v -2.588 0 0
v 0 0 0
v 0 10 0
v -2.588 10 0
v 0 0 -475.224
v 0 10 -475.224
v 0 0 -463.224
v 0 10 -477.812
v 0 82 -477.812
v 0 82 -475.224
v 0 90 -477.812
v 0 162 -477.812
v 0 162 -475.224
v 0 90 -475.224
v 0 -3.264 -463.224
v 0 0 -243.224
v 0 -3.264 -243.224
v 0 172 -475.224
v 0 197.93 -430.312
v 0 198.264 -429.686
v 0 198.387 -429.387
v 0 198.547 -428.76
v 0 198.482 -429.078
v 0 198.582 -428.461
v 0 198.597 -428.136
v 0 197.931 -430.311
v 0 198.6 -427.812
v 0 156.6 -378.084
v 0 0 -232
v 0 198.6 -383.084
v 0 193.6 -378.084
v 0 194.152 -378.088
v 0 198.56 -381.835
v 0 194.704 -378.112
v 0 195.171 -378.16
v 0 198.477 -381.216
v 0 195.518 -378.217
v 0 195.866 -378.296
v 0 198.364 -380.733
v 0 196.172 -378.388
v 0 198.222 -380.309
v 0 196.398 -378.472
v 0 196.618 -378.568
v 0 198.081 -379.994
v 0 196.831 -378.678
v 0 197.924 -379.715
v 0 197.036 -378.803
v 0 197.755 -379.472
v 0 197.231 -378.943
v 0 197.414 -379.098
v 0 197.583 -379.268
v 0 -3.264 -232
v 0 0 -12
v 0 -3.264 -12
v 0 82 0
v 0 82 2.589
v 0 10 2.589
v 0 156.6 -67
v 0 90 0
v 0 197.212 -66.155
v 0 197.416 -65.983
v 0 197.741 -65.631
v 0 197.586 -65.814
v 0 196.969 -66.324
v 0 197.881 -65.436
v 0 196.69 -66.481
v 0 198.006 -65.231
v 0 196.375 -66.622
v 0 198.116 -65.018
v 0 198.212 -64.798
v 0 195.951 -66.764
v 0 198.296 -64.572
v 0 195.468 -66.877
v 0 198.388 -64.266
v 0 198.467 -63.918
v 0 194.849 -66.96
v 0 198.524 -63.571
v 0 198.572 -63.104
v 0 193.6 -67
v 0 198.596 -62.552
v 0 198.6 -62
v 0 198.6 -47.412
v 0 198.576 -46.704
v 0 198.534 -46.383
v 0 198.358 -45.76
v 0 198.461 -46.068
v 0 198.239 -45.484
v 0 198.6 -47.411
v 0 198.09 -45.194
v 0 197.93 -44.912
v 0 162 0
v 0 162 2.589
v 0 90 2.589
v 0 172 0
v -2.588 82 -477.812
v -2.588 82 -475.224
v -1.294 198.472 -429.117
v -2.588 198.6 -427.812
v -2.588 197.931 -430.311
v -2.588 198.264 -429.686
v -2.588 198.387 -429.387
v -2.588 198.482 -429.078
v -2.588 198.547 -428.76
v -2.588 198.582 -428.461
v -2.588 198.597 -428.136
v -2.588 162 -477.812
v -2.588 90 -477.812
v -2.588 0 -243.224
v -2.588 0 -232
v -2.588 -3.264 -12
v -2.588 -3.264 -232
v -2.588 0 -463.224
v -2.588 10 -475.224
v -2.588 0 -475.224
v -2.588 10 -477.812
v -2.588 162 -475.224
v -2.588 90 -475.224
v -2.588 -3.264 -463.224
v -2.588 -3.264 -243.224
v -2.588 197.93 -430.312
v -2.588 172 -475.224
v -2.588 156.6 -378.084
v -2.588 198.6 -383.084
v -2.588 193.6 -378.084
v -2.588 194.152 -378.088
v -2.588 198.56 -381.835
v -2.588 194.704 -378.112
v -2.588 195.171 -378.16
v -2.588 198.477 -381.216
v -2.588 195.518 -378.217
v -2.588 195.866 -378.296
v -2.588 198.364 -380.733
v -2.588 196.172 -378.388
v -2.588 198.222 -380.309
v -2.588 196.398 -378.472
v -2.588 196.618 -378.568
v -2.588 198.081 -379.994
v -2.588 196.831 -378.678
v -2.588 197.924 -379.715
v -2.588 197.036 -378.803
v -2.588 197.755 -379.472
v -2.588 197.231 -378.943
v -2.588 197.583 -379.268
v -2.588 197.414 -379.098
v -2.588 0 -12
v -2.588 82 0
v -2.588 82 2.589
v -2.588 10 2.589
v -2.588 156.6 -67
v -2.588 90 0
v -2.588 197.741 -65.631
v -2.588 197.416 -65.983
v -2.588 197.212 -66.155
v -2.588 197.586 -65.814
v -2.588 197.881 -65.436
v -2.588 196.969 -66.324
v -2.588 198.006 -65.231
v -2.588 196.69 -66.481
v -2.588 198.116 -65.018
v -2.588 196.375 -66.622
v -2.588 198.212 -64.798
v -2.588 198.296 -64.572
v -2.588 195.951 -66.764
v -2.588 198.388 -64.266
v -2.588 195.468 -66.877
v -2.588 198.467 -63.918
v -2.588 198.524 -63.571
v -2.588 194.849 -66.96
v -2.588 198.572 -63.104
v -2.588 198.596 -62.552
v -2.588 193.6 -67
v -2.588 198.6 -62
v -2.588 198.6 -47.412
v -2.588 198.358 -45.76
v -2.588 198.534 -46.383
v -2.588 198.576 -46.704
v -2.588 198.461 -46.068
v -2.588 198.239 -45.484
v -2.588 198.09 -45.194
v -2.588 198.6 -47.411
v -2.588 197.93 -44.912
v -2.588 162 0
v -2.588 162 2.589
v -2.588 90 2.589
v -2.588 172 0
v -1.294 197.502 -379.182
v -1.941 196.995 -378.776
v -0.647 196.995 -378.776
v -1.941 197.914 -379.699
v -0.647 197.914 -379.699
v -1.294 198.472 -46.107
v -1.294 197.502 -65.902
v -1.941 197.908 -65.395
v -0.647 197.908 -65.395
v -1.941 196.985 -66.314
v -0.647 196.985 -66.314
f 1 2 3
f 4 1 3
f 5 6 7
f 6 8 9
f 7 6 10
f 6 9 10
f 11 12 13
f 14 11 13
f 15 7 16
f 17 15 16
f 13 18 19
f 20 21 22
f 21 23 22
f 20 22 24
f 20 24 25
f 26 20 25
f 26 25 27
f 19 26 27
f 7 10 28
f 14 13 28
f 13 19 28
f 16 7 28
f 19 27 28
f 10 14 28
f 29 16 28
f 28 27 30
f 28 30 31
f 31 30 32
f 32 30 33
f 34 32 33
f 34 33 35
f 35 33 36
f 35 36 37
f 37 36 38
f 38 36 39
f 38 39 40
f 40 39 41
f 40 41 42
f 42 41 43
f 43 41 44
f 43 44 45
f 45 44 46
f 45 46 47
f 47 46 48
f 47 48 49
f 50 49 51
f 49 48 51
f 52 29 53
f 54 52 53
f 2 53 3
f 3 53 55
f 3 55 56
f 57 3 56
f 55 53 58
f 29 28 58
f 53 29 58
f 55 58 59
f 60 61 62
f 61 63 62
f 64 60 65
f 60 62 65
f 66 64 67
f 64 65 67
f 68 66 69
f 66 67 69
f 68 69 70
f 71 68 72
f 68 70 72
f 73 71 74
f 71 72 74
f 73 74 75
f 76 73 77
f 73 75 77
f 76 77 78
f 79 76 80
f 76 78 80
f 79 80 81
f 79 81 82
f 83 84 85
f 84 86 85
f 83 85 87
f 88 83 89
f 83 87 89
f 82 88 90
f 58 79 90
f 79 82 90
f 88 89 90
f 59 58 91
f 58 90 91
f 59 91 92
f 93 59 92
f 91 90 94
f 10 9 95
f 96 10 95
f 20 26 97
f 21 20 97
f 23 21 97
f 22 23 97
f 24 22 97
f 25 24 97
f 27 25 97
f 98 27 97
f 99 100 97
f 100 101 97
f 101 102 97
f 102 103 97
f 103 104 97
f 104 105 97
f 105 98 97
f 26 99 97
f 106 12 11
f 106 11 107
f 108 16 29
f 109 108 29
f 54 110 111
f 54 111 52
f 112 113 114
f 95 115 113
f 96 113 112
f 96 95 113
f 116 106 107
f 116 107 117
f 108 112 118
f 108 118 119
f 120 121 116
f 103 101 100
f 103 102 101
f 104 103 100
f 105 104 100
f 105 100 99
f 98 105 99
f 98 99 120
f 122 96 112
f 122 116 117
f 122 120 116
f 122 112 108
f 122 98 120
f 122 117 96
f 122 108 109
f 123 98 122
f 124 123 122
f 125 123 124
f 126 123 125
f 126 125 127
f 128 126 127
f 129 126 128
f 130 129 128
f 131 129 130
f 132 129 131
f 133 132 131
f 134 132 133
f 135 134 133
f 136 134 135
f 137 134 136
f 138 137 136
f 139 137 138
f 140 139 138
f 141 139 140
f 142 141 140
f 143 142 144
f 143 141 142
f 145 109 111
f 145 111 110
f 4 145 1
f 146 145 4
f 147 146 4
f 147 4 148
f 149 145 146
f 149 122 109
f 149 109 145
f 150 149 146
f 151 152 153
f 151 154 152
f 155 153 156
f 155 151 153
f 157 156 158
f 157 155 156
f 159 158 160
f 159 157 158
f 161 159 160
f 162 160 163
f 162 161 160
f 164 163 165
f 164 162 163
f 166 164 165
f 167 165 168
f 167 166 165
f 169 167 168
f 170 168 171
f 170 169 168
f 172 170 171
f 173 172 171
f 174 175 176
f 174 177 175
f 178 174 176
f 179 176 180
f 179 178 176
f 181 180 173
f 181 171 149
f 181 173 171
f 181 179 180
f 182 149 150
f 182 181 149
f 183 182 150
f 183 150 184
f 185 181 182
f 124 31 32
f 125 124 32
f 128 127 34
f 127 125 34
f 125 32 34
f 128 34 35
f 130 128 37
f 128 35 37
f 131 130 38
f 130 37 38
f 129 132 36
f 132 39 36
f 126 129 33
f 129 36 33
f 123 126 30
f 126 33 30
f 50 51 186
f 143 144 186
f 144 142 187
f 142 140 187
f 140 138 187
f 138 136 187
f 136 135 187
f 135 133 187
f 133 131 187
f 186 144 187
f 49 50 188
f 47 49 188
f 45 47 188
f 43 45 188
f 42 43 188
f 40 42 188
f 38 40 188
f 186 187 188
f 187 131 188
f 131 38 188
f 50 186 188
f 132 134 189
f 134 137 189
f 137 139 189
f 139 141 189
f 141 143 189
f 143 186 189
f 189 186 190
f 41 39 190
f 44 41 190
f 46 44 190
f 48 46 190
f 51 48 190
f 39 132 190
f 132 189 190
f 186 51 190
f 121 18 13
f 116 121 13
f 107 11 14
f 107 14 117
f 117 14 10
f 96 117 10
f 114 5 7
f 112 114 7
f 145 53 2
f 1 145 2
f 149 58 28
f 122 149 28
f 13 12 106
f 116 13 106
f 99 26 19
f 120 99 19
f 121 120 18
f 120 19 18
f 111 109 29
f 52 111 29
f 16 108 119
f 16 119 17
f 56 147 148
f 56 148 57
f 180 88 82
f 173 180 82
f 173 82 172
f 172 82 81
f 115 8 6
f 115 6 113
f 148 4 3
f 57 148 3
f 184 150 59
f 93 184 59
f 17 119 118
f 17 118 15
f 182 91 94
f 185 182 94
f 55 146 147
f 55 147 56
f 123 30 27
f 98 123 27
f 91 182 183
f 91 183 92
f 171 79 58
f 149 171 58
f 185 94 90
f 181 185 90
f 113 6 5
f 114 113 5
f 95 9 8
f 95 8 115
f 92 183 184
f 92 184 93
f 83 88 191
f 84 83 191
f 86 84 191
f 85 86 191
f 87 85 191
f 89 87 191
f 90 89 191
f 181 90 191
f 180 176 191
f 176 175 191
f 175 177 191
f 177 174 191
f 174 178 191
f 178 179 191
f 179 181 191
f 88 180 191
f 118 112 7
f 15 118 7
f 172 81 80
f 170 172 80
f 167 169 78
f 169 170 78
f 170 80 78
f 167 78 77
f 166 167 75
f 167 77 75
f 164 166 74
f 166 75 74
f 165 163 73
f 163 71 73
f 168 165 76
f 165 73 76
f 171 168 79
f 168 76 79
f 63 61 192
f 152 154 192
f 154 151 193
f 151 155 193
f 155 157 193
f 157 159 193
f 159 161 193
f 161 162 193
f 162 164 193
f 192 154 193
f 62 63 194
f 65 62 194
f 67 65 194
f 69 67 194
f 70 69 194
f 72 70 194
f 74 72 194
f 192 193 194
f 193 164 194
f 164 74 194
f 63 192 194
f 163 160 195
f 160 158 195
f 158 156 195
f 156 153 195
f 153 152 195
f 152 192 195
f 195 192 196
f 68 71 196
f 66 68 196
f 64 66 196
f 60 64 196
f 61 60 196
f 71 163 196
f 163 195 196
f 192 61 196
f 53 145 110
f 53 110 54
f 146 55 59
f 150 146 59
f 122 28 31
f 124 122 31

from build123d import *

# Parameters (mm, degrees)
BASE_FLANGE1_DEPTH  = 2.588
SKETCH2_W           = 2.588
SKETCH2_H           = 72
BOSS_EXTRUDE1_DEPTH = 2.588
SKETCH3_W           = 2.588
SKETCH3_H           = 220
BOSS_EXTRUDE2_DEPTH = 3.264
SKETCH4_W           = 2.588
SKETCH4_H           = 72
BOSS_EXTRUDE3_DEPTH = 2.5888
FILLET1_SIZE        = 5


# Sheet-metal steps are written as plain solids
with BuildPart() as part:
    # Base-Flange1: sheet metal written as solids
    # Sketch1 → Base-Flange1 (new body)
    with BuildSketch(Plane(origin=(0, 0, 0), x_dir=(0, 0, -1), z_dir=(1, 0, 0))):
        Polygon((0, 172), (46.072551481, 198.6), (67, 198.6), (67, 156.6), (378.084, 156.6), (378.084, 198.6), (429.151448519, 198.6), (475.224, 172), (475.224, 0), (0, 0), align=None)
    extrude(amount=-BASE_FLANGE1_DEPTH)

    # Sketch2 → Boss-Extrude1 (add)
    with BuildSketch(Plane(origin=(0, 0, -475.224), x_dir=(-1, 0, 0), z_dir=(0, 0, -1))):
        with Locations((1.294, 126)):
            Rectangle(SKETCH2_W, SKETCH2_H)
        with Locations((1.294, 46)):
            Rectangle(SKETCH2_W, SKETCH2_H)
    extrude(amount=BOSS_EXTRUDE1_DEPTH)

    # Sketch3 → Boss-Extrude2 (add)
    with BuildSketch(Plane.XZ):
        with Locations((-1.294, -122)):
            Rectangle(SKETCH3_W, SKETCH3_H)
        with Locations((-1.294, -353.224)):
            Rectangle(SKETCH3_W, SKETCH3_H)
    extrude(amount=BOSS_EXTRUDE2_DEPTH)

    # Sketch4 → Boss-Extrude3 (add)
    with BuildSketch(Plane.XY):
        with Locations((-1.294, 126)):
            Rectangle(SKETCH4_W, SKETCH4_H)
        with Locations((-1.294, 46)):
            Rectangle(SKETCH4_W, SKETCH4_H)
    extrude(amount=BOSS_EXTRUDE3_DEPTH)

    # Fillet1
    # a fillet whose section is not a circle: 5 mm, written as the material it takes off along each edge
    with BuildSketch(Plane(origin=(12.5, 198.6, -378.084), x_dir=(0, -1, 0), z_dir=(-1, 0, 0)), Plane(origin=(12.5, 198.6, -67), x_dir=(0, 0, 1), z_dir=(-1, 0, 0))) as fillet1_piece_1:
        with BuildLine():
            add(Edge.make_bspline([(FILLET1_SIZE, 0), (4.159009742, 0), (3.318019485, 0), (1.464466094, -0.358459599), (0.358459599, -1.464466094), (0, -3.318019485), (0, -4.159009742), (0, -FILLET1_SIZE)], knots=[0, 0, 0, 0, 0, 0, 0.5, 0.5, 1, 1, 1, 1, 1, 1], degree=5))
            Line((0, -FILLET1_SIZE), (0, 0))
            Line((0, 0), (FILLET1_SIZE, 0))
        make_face()
    extrude(amount=27.588, mode=Mode.SUBTRACT)
    with BuildSketch(Plane(origin=(3.349364905, 198.6, -429.151448519), x_dir=(0, 0, 1), z_dir=(-1, 0, 0)), Plane(origin=(3.349364905, 198.6, -46.072551481), x_dir=(0, -0.49999999999999534, 0.8660254037844413), z_dir=(-1, 0, 0))) as fillet1_piece_2:
        with BuildLine():
            add(Edge.make_bspline([(1.339745962, 0), (1.091155955, 0), (0.842565948, 0), (0.288878575, -0.029943211), (-0.235204579, -0.170370869), (-0.729683516, -0.421282974), (-0.944968777, -0.545577978), (-1.160254038, -0.669872981)], knots=[0, 0, 0, 0, 0, 0, 0.5, 0.5, 1, 1, 1, 1, 1, 1], degree=5))
            Line((-1.160254038, -0.669872981), (0, 0))
            Line((0, 0), (1.339745962, 0))
        make_face()
    extrude(amount=9.286729811, mode=Mode.SUBTRACT)


solid = part.part
